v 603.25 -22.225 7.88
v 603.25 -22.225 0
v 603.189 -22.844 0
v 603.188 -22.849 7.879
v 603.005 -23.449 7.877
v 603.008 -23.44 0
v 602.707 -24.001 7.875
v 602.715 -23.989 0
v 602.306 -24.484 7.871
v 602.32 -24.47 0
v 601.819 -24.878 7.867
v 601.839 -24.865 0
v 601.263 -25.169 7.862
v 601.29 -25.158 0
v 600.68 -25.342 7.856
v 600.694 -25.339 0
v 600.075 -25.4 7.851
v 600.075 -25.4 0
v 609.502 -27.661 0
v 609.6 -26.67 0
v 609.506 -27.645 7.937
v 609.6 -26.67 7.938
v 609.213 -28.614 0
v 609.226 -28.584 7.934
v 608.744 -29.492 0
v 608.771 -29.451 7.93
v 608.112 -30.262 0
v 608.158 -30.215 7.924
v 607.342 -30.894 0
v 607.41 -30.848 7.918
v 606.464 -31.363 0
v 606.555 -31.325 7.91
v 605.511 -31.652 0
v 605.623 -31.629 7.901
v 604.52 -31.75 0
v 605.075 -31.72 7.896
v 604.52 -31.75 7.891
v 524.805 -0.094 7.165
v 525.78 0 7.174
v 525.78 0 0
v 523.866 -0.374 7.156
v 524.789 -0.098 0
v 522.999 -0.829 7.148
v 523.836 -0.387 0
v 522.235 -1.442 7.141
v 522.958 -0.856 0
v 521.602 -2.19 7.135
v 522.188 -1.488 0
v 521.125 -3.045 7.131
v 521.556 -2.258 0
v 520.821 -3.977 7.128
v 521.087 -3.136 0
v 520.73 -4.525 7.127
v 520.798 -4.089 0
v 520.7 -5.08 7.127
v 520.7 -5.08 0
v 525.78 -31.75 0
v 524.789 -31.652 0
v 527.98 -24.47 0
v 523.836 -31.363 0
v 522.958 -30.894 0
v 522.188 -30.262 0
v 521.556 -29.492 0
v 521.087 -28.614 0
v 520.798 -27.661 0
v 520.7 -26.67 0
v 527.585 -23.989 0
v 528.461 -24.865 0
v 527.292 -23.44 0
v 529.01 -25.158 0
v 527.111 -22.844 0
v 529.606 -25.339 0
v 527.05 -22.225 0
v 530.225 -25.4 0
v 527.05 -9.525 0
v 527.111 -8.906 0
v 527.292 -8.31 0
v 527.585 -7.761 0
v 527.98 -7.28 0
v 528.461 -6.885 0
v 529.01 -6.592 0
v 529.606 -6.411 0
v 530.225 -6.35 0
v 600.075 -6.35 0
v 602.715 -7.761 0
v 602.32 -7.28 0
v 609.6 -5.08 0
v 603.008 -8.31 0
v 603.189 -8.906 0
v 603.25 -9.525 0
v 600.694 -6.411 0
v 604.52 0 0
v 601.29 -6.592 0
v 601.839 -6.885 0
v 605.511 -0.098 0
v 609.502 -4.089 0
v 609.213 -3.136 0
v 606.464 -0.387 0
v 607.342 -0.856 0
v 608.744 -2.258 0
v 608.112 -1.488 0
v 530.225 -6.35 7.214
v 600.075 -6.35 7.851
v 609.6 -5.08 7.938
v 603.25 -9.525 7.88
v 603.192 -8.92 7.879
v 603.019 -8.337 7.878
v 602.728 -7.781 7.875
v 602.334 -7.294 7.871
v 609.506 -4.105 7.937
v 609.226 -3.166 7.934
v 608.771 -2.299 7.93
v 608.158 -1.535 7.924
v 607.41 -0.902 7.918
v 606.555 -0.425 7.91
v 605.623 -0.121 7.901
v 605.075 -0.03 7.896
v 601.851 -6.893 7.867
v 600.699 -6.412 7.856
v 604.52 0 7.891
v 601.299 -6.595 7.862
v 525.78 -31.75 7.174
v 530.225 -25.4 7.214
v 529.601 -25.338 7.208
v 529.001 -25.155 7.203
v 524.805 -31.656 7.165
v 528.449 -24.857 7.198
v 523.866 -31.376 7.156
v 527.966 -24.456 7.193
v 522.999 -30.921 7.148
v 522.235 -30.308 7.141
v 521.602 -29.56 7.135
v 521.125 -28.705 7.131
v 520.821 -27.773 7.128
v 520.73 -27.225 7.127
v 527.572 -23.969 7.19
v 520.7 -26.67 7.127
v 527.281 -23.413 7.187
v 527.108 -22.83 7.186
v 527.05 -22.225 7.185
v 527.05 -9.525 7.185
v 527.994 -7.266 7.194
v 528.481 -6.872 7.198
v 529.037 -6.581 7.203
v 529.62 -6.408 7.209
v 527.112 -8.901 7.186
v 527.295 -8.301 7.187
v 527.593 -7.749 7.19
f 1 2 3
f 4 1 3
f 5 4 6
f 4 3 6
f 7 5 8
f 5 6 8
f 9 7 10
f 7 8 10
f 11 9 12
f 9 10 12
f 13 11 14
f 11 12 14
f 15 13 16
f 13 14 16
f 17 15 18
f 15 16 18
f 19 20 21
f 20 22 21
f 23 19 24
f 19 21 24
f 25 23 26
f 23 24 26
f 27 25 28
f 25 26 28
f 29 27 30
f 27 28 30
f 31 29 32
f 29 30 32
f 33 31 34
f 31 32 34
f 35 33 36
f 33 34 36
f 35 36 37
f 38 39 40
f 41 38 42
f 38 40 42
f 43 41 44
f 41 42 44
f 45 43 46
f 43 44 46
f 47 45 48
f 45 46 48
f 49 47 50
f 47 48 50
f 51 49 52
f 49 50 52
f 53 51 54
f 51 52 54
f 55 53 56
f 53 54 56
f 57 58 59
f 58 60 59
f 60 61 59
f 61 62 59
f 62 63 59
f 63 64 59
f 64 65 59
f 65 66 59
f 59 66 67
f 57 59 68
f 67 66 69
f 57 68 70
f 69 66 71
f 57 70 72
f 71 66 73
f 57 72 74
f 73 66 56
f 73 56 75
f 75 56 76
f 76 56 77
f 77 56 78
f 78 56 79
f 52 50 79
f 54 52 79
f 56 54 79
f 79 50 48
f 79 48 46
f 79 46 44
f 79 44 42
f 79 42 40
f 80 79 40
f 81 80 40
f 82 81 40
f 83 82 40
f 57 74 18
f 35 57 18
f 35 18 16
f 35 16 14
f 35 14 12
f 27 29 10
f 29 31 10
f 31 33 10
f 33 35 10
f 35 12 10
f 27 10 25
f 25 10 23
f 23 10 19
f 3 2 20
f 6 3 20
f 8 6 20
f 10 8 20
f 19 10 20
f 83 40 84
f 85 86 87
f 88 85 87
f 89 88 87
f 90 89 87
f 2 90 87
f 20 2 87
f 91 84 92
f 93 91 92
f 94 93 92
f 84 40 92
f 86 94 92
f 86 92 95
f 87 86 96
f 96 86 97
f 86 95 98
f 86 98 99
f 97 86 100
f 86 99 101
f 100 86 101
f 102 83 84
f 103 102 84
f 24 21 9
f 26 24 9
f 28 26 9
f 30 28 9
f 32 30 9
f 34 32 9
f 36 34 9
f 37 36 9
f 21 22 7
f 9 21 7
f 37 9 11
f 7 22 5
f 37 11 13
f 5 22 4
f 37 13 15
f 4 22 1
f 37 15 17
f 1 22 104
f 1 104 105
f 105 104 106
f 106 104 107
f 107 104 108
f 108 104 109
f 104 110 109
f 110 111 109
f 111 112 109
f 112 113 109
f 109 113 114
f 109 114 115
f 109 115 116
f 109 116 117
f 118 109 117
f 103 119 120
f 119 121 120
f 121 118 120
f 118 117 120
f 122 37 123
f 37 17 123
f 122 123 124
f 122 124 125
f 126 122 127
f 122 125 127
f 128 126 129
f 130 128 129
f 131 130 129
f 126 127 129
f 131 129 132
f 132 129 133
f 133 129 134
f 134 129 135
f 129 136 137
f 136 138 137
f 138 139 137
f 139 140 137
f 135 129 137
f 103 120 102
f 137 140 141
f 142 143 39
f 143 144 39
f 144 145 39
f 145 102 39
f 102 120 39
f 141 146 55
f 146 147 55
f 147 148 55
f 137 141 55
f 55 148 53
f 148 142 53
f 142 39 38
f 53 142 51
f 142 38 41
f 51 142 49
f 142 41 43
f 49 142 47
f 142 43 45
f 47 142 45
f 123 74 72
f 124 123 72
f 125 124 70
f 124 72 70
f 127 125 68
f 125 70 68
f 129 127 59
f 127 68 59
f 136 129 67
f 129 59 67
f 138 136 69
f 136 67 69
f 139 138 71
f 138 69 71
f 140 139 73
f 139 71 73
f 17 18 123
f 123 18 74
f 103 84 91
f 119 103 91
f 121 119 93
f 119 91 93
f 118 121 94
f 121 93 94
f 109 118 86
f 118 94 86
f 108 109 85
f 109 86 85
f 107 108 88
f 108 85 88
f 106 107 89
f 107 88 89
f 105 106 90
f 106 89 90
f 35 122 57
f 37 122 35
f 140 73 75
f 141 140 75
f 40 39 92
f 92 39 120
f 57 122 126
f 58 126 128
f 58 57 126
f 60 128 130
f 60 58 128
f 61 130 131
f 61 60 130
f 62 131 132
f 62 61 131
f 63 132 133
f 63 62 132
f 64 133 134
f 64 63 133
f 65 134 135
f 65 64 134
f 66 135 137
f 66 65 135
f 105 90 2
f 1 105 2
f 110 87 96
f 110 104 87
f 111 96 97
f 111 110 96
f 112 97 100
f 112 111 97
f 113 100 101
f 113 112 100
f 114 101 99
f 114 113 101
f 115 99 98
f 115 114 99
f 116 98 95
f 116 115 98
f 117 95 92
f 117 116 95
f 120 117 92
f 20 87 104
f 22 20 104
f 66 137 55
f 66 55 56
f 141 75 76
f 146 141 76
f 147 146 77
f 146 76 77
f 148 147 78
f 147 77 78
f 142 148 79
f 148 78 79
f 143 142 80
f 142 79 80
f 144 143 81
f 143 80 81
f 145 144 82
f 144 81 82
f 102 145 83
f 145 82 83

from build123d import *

# Parameters (mm, degrees)
F3_DEPTH = 31.75
F5_DEPTH = 7.9385
F6_R     = 5.08


with BuildPart() as f3:
    # F1 (on Front) → F3 (new body)
    with BuildSketch(Plane.XZ):
        Polygon((609.6, 0), (609.6, 7.9375), (520.7, 7.127214), (520.7, 0), align=None)
    extrude(amount=F3_DEPTH)

    # F4 (on face) → F5 (cut, through all)
    with BuildSketch(Plane(origin=(0, 0, 0), x_dir=(1, 0, 0), z_dir=(0, 0, -1))):
        with BuildLine():
            Line((600.075, 25.4), (530.225, 25.4))
            ThreePointArc((530.225, 25.4), (527.979936, 24.470064), (527.05, 22.225))
            Line((527.05, 22.225), (527.05, 9.525))
            ThreePointArc((527.05, 9.525), (527.979936, 7.279936), (530.225, 6.35))
            Line((530.225, 6.35), (600.075, 6.35))
            ThreePointArc((600.075, 6.35), (602.320064, 7.279936), (603.25, 9.525))
            Line((603.25, 9.525), (603.25, 22.225))
            ThreePointArc((603.25, 22.225), (602.320064, 24.470064), (600.075, 25.4))
        make_face()
    extrude(amount=-F5_DEPTH, mode=Mode.SUBTRACT)

    # F6
    f6_edges = [f3.edges().sort_by_distance(p)[0] for p in [
        (520.7, -31.75, 3.563607),
        (520.7, 0, 3.563607),
        (609.6, -31.75, 3.96875),
        (609.6, 0, 3.96875),
    ]]
    fillet(f6_edges, radius=F6_R)


solid = f3.part
